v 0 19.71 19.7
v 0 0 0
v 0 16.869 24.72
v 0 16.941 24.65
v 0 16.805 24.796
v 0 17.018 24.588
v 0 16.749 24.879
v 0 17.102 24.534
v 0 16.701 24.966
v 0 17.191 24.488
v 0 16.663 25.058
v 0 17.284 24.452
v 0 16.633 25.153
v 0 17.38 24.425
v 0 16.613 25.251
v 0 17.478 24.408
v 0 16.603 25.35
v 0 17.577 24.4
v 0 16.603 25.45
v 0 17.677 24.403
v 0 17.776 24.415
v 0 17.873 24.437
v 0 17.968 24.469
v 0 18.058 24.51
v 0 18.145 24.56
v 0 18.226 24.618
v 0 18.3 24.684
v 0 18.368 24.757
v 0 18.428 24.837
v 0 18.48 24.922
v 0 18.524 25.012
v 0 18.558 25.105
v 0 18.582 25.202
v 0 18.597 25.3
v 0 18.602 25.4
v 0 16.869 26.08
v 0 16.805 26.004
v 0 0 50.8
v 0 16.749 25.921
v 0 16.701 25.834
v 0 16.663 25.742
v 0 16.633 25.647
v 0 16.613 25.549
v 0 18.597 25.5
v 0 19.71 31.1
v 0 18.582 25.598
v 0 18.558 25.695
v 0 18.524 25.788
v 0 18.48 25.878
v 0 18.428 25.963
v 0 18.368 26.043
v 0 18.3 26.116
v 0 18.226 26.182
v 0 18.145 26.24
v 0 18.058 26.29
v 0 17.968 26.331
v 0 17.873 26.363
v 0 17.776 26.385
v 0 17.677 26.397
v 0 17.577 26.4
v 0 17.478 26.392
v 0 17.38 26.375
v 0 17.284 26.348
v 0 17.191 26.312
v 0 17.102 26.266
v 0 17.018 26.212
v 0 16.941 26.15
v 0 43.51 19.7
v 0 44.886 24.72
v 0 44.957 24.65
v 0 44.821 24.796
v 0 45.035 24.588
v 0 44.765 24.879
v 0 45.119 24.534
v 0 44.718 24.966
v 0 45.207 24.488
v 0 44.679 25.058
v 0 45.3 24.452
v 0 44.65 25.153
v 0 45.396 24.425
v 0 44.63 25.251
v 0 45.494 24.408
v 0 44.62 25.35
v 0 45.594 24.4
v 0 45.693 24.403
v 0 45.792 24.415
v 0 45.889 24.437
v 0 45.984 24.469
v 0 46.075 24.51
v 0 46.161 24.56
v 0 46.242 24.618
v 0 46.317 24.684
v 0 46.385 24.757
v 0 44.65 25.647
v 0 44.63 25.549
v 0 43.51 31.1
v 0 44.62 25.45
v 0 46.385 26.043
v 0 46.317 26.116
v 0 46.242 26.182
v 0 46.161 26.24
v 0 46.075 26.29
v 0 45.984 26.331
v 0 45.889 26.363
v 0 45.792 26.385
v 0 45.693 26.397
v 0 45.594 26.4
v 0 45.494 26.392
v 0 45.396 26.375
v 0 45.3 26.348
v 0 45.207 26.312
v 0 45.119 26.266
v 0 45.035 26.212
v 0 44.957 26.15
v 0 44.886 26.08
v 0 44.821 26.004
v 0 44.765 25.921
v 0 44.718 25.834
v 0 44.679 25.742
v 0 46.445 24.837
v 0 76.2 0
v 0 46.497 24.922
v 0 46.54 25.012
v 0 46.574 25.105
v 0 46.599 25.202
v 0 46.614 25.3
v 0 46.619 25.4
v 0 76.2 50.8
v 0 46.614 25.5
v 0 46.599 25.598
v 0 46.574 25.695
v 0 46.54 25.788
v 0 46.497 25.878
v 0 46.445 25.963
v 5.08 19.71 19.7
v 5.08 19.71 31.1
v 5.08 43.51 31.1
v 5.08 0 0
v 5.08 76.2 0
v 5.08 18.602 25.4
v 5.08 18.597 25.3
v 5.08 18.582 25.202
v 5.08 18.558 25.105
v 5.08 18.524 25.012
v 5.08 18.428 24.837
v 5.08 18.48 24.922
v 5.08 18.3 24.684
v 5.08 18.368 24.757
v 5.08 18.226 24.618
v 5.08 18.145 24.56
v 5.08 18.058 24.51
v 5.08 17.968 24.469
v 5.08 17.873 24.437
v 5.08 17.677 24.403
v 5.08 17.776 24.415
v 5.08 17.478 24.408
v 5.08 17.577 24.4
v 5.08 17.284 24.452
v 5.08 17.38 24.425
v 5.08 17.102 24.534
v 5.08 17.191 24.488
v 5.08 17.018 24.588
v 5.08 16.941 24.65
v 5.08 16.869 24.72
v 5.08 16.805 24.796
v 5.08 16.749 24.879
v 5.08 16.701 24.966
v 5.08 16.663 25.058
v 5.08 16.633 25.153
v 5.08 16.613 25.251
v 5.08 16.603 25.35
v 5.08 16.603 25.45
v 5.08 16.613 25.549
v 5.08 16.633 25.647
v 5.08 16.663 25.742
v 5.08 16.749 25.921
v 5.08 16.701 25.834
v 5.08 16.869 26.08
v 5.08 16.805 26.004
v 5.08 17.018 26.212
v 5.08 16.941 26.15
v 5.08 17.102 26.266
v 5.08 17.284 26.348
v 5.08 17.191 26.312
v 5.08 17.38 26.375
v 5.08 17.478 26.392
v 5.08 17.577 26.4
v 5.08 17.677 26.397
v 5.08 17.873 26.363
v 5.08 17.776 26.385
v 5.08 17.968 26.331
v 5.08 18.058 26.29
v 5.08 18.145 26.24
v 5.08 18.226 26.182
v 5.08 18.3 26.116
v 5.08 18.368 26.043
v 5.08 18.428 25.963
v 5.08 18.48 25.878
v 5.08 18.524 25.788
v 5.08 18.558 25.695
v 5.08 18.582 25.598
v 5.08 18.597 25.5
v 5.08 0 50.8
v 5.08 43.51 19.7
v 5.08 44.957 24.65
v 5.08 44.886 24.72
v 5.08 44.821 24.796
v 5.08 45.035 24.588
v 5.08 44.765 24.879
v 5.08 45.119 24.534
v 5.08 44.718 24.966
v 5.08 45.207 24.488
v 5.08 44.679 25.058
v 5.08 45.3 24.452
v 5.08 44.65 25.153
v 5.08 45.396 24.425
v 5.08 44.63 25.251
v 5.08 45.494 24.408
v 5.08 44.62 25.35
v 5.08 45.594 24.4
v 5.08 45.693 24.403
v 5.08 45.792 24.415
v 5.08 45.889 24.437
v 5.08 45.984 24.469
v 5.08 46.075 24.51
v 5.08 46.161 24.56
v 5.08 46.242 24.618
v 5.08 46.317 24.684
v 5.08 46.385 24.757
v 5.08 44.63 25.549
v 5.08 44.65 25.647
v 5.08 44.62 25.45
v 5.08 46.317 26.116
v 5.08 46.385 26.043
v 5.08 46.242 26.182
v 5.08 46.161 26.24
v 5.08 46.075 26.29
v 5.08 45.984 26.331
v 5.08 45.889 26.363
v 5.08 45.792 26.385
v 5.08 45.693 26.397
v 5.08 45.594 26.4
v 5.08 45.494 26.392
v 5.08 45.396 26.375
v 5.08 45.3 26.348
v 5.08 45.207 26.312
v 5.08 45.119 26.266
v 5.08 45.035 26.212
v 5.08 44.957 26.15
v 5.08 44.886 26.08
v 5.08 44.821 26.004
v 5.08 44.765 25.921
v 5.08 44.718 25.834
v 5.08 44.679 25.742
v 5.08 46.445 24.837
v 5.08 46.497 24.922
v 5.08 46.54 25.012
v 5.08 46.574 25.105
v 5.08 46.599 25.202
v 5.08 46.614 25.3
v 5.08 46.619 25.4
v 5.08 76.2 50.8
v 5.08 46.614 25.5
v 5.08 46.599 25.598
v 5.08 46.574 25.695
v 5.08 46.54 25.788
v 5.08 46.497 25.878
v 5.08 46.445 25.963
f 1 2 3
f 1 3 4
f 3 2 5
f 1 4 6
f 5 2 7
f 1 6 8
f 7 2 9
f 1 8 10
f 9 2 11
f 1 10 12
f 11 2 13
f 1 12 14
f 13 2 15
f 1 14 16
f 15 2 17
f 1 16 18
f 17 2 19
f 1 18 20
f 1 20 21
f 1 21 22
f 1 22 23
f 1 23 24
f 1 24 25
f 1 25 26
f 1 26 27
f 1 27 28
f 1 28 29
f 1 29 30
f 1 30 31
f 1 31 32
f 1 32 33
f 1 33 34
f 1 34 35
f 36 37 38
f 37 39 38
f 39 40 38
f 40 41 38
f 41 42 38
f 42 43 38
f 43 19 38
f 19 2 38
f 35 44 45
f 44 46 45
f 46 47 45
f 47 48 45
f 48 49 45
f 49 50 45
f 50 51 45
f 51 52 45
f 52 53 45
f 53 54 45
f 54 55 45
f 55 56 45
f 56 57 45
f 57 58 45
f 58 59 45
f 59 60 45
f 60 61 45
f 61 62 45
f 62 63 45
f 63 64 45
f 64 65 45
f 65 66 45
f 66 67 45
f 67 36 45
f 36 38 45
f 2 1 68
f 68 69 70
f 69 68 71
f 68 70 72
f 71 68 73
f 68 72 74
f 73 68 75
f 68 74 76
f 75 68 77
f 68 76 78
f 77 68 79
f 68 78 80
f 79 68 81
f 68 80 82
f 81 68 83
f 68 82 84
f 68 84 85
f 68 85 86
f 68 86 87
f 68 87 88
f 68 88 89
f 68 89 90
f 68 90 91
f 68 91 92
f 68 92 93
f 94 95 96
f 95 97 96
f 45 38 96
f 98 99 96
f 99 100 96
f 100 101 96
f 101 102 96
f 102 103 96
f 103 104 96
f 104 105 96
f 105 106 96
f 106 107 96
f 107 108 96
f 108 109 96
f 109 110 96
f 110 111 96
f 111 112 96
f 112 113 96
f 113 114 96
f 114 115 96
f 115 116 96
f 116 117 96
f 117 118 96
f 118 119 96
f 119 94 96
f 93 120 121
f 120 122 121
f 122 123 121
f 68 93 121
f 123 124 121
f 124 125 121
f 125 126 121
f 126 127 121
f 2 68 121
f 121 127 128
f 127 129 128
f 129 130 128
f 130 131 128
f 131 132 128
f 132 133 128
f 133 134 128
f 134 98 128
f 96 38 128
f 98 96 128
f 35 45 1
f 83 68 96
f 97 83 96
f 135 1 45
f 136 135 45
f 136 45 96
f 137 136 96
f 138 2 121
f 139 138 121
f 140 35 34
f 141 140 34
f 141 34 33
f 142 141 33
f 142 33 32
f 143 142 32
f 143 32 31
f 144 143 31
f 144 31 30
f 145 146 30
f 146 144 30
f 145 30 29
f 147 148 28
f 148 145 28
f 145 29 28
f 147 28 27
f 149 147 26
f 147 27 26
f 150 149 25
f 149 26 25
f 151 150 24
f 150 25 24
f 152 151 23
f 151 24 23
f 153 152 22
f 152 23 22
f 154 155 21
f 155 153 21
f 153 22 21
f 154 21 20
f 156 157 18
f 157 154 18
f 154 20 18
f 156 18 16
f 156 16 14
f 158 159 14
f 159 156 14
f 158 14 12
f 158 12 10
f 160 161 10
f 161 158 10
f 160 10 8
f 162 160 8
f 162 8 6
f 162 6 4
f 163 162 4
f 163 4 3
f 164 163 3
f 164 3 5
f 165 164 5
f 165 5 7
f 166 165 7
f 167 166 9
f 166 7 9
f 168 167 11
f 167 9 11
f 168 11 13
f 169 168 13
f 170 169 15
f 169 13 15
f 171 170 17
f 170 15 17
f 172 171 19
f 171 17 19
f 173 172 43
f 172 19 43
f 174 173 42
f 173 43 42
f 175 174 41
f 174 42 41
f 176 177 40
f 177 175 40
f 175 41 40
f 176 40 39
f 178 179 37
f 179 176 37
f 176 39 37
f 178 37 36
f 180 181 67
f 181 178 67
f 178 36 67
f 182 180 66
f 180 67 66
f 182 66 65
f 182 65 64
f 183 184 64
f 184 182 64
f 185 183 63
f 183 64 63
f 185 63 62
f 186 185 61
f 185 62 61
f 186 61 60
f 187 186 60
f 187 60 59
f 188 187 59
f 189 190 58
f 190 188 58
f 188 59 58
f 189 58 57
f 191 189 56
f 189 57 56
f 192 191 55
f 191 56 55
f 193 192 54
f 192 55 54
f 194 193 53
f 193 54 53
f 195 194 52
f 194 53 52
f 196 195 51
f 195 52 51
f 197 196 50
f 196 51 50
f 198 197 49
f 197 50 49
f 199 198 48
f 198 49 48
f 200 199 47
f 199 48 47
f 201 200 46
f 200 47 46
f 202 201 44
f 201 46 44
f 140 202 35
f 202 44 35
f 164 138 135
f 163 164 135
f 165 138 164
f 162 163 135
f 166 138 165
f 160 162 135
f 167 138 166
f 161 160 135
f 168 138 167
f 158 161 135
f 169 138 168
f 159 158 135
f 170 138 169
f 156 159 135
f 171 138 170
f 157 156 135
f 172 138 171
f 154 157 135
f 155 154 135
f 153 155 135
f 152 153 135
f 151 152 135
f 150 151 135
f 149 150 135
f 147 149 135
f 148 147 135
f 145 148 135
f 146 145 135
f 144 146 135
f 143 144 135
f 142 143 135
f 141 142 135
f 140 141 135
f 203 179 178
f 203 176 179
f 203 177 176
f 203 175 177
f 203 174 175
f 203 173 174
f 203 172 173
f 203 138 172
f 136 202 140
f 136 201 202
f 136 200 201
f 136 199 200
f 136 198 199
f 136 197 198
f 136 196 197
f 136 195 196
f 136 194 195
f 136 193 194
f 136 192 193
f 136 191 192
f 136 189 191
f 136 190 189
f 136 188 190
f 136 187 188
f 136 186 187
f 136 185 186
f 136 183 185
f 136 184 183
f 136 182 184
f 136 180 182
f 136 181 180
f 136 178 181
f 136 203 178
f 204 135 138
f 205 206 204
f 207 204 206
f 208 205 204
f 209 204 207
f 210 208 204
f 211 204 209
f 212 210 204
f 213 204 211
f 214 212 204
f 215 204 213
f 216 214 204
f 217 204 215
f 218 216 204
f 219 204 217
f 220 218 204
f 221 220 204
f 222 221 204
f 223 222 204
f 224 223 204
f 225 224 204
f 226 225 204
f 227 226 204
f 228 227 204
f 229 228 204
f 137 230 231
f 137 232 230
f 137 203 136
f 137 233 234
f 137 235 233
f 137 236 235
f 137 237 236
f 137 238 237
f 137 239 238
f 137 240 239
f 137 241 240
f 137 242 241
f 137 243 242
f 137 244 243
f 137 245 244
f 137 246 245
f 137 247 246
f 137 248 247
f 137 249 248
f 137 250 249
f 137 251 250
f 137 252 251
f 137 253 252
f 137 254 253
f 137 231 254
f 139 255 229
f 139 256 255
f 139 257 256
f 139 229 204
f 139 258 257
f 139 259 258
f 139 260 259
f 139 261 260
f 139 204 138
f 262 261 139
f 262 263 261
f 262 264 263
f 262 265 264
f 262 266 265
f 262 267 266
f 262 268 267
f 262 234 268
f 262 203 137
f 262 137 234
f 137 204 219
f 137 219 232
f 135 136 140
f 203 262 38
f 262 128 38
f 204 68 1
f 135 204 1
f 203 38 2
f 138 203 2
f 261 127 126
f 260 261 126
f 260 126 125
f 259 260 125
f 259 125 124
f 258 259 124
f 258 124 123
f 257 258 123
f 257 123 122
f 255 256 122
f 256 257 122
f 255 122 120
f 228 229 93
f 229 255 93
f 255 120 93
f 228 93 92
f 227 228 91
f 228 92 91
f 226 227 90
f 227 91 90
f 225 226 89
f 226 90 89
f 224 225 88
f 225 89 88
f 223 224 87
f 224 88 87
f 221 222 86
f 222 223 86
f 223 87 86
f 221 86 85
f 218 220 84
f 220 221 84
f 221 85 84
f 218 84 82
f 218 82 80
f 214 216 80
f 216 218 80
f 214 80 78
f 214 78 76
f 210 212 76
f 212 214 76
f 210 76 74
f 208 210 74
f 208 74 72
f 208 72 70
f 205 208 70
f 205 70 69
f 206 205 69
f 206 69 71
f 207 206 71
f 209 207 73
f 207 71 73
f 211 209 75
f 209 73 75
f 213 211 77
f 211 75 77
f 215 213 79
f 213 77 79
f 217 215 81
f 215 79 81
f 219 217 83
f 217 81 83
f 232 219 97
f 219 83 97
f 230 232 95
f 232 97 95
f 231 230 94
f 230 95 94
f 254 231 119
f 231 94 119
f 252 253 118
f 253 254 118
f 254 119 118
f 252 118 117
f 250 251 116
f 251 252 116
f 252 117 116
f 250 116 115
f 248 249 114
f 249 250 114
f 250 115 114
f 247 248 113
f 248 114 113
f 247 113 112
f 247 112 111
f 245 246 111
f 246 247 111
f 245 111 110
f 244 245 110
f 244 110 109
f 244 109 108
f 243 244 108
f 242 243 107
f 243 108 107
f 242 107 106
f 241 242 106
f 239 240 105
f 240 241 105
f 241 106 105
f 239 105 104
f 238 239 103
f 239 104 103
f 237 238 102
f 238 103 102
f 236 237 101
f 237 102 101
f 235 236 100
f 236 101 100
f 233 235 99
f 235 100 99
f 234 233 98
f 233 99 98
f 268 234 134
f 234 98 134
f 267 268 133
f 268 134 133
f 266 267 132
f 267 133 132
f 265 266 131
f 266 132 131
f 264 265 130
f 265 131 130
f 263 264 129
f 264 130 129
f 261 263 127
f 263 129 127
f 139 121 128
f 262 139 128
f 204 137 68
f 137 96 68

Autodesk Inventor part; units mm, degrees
ref_plane "YZ Plane" through (0, 0, 0) normal (1, 0, 0) x (0, 1, 0)
ref_plane "XZ Plane" through (0, 0, 0) normal (0, 1, 0) x (-1, 0, 0)
ref_plane "XY Plane" through (0, 0, 0) normal (0, 0, 1) x (1, 0, 0)
sketch "Sketch1" plane through (0, 0, 0) normal (1, 0, 0) x (0, 1, 0)
  line L0 (0, 0) -> (76.2, 0)
  line L1 (76.2, 0) -> (76.2, 50.8)
  line L2 (76.2, 50.8) -> (0, 50.8)
  line L3 (0, 50.8) -> (0, 0)
  line L4 (0, 25.4) -> (76.2, 25.4) construction
  circle A0 centre (25.4, 25.4) radius 3.81
  line L5 (43.5104, 25.4) -> (19.7104, 25.4) construction
  line L6 (19.7104, 19.7) -> (19.7104, 31.1)
  line L7 (19.7104, 31.1) -> (43.5104, 31.1)
  line L8 (43.5104, 31.1) -> (43.5104, 19.7)
  line L9 (43.5104, 19.7) -> (19.7104, 19.7)
  line L10 (31.6104, 19.7) -> (31.6104, 31.1) construction
  circle A1 centre (17.6022, 25.4) radius 1
  circle A2 centre (45.6186, 25.4) radius 1
  line L11 (25.4, 19.7) -> (25.4, 31.1) construction
  dimension "d0" = 76.2
  dimension "d1" = 50.8
  dimension "d2" = 23.8
  dimension "d3" = 11.4
  dimension "d4" = 2
  dimension "d5" = 2.1082
  dimension "d6" = 5.6896
  dimension "d7" = 25.4
extrude "Extrusion1" add sketch "Sketch1" along normal blind 5.08 contours L3 L2 L1 L0
properties part number "gripper_servo"
